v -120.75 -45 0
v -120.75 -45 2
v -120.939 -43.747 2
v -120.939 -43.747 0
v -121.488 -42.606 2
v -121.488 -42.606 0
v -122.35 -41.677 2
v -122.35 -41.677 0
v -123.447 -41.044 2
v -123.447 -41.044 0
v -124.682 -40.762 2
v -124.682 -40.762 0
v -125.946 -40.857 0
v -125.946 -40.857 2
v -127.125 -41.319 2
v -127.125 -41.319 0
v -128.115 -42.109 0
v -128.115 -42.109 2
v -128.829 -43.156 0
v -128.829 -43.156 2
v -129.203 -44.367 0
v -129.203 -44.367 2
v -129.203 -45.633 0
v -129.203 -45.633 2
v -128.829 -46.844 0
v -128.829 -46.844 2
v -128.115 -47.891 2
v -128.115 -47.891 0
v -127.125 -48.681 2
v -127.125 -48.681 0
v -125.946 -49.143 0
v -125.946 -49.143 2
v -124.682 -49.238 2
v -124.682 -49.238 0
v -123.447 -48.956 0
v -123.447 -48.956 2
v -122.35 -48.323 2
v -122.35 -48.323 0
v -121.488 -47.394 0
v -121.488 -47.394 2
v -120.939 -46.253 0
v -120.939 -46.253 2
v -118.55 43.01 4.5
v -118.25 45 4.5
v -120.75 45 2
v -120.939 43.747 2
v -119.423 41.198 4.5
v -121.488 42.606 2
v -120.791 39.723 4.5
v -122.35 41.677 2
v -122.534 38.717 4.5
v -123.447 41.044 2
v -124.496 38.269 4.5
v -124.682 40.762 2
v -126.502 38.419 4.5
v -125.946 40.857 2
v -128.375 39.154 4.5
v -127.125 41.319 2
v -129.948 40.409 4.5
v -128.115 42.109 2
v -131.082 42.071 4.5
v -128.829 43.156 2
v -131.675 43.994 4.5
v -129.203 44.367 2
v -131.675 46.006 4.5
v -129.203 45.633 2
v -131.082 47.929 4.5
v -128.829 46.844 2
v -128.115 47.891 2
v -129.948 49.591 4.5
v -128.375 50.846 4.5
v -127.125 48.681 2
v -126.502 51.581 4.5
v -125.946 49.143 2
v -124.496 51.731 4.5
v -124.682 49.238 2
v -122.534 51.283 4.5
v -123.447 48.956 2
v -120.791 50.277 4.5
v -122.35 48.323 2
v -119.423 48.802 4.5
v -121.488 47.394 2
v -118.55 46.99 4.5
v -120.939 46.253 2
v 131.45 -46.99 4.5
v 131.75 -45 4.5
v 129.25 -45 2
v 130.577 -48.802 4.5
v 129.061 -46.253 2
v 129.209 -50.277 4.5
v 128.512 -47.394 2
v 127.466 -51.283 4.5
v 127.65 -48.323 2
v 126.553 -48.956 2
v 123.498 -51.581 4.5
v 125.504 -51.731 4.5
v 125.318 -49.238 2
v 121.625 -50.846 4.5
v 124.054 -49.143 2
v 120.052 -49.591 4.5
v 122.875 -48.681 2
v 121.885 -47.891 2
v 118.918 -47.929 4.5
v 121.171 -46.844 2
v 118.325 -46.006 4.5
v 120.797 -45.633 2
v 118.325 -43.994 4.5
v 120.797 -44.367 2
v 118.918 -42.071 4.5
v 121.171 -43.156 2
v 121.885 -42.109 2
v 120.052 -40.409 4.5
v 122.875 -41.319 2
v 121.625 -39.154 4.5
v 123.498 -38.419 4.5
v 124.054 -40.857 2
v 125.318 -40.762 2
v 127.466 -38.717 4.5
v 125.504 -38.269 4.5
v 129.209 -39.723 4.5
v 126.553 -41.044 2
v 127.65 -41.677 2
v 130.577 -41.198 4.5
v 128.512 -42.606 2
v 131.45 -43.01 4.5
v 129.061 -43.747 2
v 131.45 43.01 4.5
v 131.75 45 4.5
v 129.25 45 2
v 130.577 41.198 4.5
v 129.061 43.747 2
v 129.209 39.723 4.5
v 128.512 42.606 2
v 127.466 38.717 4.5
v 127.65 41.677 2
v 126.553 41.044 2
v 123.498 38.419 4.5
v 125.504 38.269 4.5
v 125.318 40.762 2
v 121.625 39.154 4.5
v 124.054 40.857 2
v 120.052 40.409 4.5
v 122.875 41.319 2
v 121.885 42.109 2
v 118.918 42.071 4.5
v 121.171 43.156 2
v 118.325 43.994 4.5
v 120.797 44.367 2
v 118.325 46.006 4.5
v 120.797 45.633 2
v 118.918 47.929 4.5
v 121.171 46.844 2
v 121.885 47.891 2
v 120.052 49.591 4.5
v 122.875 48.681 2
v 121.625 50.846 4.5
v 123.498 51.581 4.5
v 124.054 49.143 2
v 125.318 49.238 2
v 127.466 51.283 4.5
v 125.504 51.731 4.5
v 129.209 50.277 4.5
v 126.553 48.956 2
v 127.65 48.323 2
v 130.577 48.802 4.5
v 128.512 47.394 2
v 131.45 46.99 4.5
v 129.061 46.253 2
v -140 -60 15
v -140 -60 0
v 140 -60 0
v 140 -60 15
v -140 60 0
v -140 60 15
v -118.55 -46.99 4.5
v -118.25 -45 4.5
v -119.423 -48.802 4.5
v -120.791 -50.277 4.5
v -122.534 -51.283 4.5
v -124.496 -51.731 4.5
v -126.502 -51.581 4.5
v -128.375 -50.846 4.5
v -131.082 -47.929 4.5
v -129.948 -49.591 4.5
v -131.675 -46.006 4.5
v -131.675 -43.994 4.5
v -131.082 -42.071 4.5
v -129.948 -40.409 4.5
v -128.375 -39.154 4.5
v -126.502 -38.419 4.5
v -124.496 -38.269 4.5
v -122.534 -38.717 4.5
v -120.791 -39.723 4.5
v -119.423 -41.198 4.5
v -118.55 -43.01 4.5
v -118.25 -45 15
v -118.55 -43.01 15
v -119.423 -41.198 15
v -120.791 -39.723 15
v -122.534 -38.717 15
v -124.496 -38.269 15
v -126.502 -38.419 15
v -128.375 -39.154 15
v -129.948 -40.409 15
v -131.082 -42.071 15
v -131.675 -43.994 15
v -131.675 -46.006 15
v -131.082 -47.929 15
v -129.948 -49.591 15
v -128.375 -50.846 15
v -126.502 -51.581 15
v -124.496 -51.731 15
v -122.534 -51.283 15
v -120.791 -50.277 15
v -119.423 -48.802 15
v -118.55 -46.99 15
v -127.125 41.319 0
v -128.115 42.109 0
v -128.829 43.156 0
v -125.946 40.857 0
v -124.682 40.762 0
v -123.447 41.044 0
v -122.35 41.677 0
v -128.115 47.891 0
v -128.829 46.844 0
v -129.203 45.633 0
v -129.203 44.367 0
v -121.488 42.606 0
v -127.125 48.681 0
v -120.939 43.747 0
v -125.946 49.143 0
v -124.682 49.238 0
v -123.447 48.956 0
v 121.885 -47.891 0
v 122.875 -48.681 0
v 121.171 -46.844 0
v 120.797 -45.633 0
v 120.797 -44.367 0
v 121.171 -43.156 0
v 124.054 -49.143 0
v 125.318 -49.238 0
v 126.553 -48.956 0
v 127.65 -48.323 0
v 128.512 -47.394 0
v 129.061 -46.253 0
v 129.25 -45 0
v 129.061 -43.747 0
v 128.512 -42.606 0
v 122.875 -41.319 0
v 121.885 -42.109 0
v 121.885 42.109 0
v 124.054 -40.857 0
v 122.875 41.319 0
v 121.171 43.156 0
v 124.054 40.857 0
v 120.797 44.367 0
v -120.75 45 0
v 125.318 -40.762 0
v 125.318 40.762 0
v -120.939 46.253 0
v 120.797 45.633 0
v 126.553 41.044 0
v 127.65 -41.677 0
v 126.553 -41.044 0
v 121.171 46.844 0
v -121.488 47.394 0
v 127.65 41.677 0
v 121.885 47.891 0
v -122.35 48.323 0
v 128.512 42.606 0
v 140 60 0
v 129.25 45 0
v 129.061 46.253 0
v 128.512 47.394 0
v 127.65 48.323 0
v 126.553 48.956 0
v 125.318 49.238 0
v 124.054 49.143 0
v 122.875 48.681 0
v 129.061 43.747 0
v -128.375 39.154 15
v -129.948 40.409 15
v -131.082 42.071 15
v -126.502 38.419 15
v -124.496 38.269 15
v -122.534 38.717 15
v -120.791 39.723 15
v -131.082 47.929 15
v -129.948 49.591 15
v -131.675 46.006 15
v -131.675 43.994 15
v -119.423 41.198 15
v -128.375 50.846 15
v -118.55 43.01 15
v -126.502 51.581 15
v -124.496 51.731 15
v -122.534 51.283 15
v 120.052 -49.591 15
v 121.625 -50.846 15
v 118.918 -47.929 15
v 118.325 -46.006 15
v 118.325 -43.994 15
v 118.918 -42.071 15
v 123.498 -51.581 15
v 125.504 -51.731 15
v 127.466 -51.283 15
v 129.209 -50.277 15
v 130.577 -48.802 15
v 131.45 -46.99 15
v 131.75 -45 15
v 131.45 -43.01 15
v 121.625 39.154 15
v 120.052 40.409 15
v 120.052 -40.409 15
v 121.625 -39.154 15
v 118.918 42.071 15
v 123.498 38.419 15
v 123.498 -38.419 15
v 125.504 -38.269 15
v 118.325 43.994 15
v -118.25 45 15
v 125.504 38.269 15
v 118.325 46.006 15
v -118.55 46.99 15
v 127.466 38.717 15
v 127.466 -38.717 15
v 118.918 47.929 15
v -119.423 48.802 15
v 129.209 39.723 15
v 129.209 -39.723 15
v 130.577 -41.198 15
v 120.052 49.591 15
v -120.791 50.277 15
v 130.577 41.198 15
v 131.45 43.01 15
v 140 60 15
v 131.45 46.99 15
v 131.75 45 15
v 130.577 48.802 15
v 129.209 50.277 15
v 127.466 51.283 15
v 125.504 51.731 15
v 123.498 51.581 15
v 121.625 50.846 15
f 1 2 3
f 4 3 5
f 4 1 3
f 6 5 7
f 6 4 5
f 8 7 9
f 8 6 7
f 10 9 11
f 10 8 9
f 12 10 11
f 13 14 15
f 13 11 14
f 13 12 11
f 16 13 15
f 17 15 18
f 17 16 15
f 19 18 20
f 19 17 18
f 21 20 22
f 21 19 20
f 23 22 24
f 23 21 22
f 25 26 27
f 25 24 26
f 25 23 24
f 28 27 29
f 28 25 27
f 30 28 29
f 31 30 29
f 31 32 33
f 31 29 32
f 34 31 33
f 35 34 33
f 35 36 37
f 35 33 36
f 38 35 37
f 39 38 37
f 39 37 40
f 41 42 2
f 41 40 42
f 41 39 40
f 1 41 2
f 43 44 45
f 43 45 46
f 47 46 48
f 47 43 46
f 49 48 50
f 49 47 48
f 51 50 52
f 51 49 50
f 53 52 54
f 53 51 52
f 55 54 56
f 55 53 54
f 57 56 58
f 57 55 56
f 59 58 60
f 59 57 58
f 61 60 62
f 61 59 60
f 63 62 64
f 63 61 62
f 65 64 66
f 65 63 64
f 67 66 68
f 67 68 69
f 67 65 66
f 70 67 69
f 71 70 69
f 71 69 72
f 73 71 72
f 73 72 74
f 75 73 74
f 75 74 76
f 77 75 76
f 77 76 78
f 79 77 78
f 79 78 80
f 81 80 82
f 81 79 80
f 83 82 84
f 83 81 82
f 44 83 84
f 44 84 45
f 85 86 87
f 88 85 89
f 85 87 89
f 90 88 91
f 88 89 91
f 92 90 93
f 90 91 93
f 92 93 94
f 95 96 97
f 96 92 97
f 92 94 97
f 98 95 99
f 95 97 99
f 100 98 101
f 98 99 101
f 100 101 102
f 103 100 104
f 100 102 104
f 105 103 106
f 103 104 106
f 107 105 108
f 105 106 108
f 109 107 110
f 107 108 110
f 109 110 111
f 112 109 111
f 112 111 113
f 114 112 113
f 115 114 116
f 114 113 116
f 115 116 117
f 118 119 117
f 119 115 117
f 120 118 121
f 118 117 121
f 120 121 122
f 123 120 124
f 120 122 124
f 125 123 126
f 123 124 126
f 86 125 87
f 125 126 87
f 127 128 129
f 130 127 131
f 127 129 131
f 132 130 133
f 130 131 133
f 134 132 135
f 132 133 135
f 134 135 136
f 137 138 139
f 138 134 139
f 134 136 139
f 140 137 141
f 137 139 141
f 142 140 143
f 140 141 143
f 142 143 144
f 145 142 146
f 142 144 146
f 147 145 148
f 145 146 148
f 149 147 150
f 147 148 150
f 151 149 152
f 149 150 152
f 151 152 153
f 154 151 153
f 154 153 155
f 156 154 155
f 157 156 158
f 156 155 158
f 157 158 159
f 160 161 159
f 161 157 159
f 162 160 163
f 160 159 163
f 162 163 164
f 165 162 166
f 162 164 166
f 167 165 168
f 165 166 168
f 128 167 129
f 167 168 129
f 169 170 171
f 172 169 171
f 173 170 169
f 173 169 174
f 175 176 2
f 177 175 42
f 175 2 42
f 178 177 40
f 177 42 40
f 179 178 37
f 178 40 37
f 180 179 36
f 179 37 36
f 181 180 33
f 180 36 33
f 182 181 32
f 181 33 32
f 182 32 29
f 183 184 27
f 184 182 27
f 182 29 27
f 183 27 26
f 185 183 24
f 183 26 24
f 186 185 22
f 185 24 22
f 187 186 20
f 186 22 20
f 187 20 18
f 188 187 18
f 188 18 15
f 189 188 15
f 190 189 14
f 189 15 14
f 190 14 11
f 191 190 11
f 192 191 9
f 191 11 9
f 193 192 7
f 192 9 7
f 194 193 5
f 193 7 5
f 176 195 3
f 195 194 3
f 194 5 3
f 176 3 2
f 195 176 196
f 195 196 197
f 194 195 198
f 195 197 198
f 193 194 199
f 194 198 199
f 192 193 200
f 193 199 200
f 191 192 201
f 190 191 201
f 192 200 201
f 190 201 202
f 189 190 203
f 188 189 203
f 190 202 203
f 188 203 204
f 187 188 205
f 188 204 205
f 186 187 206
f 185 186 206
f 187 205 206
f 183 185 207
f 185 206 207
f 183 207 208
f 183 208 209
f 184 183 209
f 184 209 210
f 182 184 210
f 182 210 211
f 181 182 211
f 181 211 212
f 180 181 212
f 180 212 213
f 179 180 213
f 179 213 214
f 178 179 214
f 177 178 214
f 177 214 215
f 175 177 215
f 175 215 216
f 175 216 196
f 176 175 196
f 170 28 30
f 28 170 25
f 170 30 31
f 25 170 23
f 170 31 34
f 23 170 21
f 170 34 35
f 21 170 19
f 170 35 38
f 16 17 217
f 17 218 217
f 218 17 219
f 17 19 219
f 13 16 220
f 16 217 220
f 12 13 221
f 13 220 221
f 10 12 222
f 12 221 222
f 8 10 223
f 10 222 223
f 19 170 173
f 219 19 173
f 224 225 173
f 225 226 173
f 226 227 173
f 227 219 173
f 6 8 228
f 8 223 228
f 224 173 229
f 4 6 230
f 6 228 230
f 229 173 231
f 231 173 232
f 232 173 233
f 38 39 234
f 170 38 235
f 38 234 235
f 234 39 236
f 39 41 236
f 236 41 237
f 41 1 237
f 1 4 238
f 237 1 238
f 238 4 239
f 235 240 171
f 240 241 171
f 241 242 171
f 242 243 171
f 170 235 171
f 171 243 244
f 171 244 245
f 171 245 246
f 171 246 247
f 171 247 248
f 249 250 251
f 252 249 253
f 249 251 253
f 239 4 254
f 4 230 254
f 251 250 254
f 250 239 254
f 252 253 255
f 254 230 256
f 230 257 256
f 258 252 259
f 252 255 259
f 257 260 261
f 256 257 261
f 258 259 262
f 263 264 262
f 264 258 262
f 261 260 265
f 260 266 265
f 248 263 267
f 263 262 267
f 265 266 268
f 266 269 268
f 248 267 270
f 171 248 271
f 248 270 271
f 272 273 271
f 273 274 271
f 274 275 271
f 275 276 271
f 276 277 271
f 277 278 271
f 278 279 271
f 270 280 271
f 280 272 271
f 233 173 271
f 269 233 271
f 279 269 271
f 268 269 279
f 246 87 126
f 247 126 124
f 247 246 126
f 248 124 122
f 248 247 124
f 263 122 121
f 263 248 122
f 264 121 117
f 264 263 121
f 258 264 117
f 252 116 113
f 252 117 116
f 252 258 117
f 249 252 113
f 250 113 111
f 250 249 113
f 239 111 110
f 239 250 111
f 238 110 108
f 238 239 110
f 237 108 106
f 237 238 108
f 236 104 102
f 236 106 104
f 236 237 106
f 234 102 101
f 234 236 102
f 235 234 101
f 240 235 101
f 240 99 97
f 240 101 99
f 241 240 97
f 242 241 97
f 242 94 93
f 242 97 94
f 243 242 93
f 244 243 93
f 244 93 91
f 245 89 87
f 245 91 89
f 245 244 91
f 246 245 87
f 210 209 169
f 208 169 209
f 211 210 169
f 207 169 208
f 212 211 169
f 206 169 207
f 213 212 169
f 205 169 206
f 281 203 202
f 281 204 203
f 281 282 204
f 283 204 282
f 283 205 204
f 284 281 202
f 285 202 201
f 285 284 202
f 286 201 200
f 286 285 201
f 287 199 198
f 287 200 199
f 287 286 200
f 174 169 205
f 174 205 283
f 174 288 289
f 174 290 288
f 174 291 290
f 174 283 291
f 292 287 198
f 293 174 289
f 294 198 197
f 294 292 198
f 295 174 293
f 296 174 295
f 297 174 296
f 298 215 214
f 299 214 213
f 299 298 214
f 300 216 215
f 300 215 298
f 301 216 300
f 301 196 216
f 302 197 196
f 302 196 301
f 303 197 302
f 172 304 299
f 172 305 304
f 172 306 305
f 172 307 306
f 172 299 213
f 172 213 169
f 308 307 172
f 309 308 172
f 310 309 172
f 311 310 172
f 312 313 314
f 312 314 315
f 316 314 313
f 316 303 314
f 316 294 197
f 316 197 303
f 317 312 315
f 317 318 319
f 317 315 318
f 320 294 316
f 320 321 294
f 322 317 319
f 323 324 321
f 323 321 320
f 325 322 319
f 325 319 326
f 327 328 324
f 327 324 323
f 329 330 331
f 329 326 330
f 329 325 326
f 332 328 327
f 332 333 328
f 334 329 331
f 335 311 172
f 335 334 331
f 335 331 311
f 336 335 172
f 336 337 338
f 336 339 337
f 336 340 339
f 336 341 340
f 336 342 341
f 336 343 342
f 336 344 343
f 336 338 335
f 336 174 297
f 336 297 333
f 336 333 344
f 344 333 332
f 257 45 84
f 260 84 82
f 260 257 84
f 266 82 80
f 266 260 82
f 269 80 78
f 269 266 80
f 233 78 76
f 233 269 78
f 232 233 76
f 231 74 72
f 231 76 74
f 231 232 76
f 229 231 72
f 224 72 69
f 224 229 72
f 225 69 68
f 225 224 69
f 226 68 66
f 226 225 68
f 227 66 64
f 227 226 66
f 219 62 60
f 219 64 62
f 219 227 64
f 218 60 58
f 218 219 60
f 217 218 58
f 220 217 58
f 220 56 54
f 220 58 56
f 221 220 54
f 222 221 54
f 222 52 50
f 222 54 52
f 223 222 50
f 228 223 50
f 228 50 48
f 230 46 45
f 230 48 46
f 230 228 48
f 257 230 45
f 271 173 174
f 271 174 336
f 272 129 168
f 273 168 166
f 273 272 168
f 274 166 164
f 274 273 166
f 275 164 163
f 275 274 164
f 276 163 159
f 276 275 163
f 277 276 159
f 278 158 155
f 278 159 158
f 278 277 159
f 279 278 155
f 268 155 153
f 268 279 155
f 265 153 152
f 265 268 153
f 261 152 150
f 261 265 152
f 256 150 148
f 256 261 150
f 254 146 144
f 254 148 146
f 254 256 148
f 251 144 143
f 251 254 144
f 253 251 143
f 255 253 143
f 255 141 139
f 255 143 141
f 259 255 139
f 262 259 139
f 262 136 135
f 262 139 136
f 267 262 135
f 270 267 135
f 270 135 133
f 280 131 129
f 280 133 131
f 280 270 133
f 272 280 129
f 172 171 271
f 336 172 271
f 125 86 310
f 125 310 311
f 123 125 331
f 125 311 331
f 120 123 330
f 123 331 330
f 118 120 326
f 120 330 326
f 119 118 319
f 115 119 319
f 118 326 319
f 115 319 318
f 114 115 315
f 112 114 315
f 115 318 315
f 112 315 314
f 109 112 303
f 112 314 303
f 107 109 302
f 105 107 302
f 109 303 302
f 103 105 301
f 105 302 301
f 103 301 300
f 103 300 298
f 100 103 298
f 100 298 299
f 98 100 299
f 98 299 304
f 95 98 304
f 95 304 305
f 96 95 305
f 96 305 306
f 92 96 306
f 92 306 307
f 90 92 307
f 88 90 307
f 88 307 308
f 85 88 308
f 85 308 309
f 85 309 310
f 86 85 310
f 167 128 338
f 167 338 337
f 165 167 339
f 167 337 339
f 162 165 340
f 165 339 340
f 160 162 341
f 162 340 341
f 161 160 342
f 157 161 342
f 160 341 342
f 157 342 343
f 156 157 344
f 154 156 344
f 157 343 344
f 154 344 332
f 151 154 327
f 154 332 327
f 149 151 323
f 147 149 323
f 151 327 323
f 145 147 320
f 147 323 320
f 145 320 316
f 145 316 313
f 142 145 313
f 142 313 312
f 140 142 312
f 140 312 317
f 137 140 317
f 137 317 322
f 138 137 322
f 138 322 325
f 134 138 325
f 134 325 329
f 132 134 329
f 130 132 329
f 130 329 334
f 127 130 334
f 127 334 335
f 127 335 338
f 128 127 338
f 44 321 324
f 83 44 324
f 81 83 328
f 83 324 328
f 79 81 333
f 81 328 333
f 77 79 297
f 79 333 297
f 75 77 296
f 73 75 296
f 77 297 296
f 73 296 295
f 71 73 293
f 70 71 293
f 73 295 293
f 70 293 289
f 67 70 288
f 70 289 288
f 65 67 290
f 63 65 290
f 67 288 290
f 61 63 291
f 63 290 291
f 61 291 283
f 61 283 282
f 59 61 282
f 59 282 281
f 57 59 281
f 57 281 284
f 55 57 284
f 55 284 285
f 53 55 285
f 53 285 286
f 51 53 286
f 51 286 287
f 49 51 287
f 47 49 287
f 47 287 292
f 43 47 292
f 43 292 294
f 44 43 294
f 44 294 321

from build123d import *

# Parameters (mm, degrees)
SKETCH1_W           = 280
SKETCH1_H           = 120
SKETCH1_R           = 4.25
BOSS_EXTRUDE1_DEPTH = 15
SKETCH2_R           = 6.75
CUT_EXTRUDE1_DEPTH  = 10
CHAMFER2_SIZE       = 3
CHAMFER3_SIZE       = 3


with BuildPart() as part:
    # Sketch1 → Boss-Extrude1 (new body)
    with BuildSketch(Plane.XY):
        Rectangle(SKETCH1_W, SKETCH1_H)
        with Locations((-125, 45)):
            Circle(SKETCH1_R, mode=Mode.SUBTRACT)
        with Locations((125, 45)):
            Circle(SKETCH1_R, mode=Mode.SUBTRACT)
        with Locations((125, -45)):
            Circle(SKETCH1_R, mode=Mode.SUBTRACT)
        with Locations((-125, -45)):
            Circle(SKETCH1_R, mode=Mode.SUBTRACT)
    extrude(amount=BOSS_EXTRUDE1_DEPTH)

    # Sketch2 → Cut-Extrude1 (cut)
    with BuildSketch(Plane.XY.offset(15)):
        with Locations((-125, 45)):
            Circle(SKETCH2_R)
        with Locations((125, 45)):
            Circle(SKETCH2_R)
        with Locations((125, -45)):
            Circle(SKETCH2_R)
        with Locations((-125, -45)):
            Circle(SKETCH2_R)
    extrude(amount=-CUT_EXTRUDE1_DEPTH, mode=Mode.SUBTRACT)

    # Chamfer2
    # the kernel refuses this chamfer: 3 mm, written as the material it takes off along each edge
    with BuildSketch(Plane(origin=(-125, 45, 5), x_dir=(1, 0, 0), z_dir=(0, 1, 0))) as chamfer2_piece_1_section:
        Polygon((4.25, CHAMFER2_SIZE), (4.25 + CHAMFER2_SIZE, 0), (4.25, 0), align=None)
    chamfer2_piece_1 = revolve(axis=Axis((-125, 45, 5), (0, 0, -1)), mode=Mode.PRIVATE)
    chamfer2_piece_1 = chamfer2_piece_1 & Plane(origin=(-125, 45, 3.245521929), x_dir=(1, 0, 0), z_dir=(0, 0, 1)) * Cylinder(6.75, 29, mode=Mode.PRIVATE)
    add(chamfer2_piece_1, mode=Mode.SUBTRACT)

    # Chamfer3
    # the kernel refuses this chamfer: 3 mm, written as the material it takes off along each edge
    with BuildSketch(Plane(origin=(125, 45, 5), x_dir=(1, 0, 0), z_dir=(0, 1, 0))) as chamfer3_piece_1_section:
        Polygon((4.25 + CHAMFER3_SIZE, 0), (4.25, CHAMFER3_SIZE), (4.25, 0), align=None)
    chamfer3_piece_1 = revolve(axis=Axis((125, 45, 5), (0, 0, -1)), mode=Mode.PRIVATE)
    chamfer3_piece_1 = chamfer3_piece_1 & Plane(origin=(125, 45, 3.245521929), x_dir=(1, 0, 0), z_dir=(0, 0, 1)) * Cylinder(6.75, 29, mode=Mode.PRIVATE)
    add(chamfer3_piece_1, mode=Mode.SUBTRACT)
    with BuildSketch(Plane(origin=(125, -45, 5), x_dir=(1, 0, 0), z_dir=(0, 1, 0))) as chamfer3_piece_2_section:
        Polygon((4.25 + CHAMFER3_SIZE, 0), (4.25, CHAMFER3_SIZE), (4.25, 0), align=None)
    chamfer3_piece_2 = revolve(axis=Axis((125, -45, 5), (0, 0, -1)), mode=Mode.PRIVATE)
    chamfer3_piece_2 = chamfer3_piece_2 & Plane(origin=(125, -45, 3.245521929), x_dir=(1, 0, 0), z_dir=(0, 0, 1)) * Cylinder(6.75, 29, mode=Mode.PRIVATE)
    add(chamfer3_piece_2, mode=Mode.SUBTRACT)
    with BuildSketch(Plane(origin=(-125, -45, 5), x_dir=(1, 0, 0), z_dir=(0, 1, 0))) as chamfer3_piece_3_section:
        Polygon((4.25 + CHAMFER3_SIZE, 0), (4.25, CHAMFER3_SIZE), (4.25, 0), align=None)
    chamfer3_piece_3 = revolve(axis=Axis((-125, -45, 5), (0, 0, -1)), mode=Mode.PRIVATE)
    chamfer3_piece_3 = chamfer3_piece_3 & Plane(origin=(-125, -45, 3.245521929), x_dir=(1, 0, 0), z_dir=(0, 0, 1)) * Cylinder(6.75, 29, mode=Mode.PRIVATE)
    add(chamfer3_piece_3, mode=Mode.SUBTRACT)


solid = part.part
